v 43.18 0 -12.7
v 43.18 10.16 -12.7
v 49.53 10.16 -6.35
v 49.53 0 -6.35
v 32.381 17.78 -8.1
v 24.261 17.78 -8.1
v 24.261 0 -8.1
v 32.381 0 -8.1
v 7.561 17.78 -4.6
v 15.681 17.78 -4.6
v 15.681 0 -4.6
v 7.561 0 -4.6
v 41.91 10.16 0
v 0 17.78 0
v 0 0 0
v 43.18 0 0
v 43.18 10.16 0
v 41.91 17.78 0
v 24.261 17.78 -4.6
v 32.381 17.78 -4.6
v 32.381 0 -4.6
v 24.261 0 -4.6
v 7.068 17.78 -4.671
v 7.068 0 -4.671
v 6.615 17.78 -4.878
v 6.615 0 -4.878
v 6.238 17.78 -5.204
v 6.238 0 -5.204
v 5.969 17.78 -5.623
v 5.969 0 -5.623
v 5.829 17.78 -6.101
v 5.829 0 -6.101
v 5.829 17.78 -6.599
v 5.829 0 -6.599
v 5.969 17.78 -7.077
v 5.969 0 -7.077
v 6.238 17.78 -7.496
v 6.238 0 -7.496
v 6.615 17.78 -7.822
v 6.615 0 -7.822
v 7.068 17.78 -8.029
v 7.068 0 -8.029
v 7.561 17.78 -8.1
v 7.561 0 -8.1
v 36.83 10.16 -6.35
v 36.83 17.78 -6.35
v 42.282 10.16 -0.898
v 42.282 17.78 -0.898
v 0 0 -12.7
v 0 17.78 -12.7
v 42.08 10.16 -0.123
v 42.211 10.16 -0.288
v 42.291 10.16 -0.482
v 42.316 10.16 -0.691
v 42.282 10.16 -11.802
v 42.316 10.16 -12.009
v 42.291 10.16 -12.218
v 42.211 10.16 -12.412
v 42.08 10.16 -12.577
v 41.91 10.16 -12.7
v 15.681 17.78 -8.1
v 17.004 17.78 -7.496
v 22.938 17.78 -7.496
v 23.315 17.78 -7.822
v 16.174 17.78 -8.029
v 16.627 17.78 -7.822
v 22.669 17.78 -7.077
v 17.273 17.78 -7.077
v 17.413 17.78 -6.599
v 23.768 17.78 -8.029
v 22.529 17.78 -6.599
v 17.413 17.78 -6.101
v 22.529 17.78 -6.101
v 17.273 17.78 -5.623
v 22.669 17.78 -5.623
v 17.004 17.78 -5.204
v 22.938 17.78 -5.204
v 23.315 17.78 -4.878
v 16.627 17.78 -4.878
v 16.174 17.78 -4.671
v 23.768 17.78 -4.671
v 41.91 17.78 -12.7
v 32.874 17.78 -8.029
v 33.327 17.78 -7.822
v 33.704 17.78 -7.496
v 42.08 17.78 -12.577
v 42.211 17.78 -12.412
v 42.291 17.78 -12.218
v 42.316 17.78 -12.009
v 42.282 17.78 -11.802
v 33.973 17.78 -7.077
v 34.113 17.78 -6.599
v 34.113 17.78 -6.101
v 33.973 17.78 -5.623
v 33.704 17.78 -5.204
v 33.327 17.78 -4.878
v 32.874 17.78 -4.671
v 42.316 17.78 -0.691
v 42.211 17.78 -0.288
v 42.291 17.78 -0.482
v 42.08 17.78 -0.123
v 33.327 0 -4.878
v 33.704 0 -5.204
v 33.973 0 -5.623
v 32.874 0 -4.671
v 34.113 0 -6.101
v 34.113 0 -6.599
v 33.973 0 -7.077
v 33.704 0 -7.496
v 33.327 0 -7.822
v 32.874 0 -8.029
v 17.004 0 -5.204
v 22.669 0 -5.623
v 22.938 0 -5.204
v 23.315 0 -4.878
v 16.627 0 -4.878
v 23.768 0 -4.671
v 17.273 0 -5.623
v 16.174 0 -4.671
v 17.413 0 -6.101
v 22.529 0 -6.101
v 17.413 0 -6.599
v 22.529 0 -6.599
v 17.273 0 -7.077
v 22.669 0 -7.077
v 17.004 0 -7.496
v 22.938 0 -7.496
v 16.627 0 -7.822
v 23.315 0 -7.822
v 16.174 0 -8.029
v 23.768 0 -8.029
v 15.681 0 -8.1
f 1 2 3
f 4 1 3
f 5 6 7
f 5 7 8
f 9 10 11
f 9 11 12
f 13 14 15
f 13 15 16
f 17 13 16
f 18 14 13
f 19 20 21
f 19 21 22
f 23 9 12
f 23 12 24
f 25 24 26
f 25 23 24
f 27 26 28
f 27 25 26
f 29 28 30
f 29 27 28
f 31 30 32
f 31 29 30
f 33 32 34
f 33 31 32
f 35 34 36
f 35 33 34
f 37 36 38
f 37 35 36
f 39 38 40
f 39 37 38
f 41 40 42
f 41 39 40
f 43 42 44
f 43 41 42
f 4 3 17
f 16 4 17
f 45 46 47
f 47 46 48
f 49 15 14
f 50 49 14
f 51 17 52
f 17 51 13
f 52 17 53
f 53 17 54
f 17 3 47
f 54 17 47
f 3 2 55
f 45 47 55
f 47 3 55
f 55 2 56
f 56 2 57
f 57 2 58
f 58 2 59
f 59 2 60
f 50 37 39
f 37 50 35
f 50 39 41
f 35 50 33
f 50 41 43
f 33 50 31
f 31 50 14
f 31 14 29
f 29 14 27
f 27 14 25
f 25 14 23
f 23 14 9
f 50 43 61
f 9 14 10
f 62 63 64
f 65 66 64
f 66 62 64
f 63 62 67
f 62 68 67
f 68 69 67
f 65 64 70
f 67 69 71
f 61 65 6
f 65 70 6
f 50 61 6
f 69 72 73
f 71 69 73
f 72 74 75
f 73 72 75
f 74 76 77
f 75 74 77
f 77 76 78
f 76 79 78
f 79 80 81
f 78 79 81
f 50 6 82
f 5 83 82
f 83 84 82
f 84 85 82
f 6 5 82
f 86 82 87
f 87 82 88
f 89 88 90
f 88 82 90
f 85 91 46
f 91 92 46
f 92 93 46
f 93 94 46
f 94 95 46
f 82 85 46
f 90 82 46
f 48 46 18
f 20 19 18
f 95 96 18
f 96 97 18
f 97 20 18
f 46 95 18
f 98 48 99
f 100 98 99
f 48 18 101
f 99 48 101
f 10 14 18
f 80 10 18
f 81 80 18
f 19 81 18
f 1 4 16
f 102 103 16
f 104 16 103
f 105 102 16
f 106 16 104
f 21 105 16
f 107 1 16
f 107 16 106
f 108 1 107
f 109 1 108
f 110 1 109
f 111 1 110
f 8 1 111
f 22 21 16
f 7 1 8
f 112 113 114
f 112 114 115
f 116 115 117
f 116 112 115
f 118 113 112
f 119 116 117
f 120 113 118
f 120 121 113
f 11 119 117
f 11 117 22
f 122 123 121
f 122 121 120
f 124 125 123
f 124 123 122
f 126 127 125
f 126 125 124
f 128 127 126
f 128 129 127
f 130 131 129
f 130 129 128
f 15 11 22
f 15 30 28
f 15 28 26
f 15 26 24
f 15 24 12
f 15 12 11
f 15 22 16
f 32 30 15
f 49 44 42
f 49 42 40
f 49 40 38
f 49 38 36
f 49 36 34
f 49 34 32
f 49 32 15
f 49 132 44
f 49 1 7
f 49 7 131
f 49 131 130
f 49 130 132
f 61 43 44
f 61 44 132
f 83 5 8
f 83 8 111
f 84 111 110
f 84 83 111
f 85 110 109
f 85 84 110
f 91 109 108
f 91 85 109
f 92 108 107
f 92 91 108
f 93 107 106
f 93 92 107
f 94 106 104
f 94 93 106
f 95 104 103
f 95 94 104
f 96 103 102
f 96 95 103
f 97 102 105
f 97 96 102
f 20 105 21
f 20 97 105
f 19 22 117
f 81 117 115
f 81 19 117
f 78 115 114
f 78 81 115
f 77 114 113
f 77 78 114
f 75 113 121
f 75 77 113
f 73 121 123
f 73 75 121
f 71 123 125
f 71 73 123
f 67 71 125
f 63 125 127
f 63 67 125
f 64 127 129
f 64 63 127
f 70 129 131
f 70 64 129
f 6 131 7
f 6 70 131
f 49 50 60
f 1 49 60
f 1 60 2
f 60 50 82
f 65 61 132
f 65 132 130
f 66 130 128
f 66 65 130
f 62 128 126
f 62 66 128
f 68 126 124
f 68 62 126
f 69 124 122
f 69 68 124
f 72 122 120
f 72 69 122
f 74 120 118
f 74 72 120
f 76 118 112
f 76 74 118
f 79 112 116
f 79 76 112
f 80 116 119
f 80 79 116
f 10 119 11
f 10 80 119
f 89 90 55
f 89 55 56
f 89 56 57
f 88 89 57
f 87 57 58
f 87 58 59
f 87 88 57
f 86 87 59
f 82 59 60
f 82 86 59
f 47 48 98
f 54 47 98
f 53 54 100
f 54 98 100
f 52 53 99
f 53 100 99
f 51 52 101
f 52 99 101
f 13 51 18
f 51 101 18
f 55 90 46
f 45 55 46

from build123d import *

# Parameters (mm, degrees)
SKETCH1_W           = 43.18
SKETCH1_H           = 17.78
BOSS_EXTRUDE1_DEPTH = 12.7
CUT_EXTRUDE1_DEPTH  = 7.62
CUT_EXTRUDE2_DEPTH  = 18.78
BOSS_EXTRUDE2_DEPTH = 10.16
CUT_EXTRUDE3_DEPTH  = 7.62


with BuildPart() as part:
    # Sketch1 → Boss-Extrude1 (new body)
    with BuildSketch(Plane.XY):
        with Locations((21.59, 8.89)):
            Rectangle(SKETCH1_W, SKETCH1_H)
    extrude(amount=-BOSS_EXTRUDE1_DEPTH)

    # Sketch3 → Cut-Extrude1 (cut)
    with BuildSketch(Plane(origin=(0, 17.78, 0), x_dir=(1, 0, 0), z_dir=(0, 1, 0))):
        Polygon((43.18, 12.7), (36.83, 6.35), (43.18, 0), align=None)
    extrude(amount=-CUT_EXTRUDE1_DEPTH, mode=Mode.SUBTRACT)

    # Sketch4 → Cut-Extrude2 (cut, through all)
    with BuildSketch(Plane(origin=(0, 17.78, 0), x_dir=(1, 0, 0), z_dir=(0, 1, 0))):
        with BuildLine():
            Line((32.381000008, 4.599999944), (24.260999992, 4.599999944))
            ThreePointArc((24.260999992, 4.599999944), (22.510999936, 6.35), (24.260999992, 8.100000056))
            Line((24.260999992, 8.100000056), (32.381000008, 8.100000056))
            ThreePointArc((32.381000008, 8.100000056), (34.131000064, 6.35), (32.381000008, 4.599999944))
        make_face()
        with BuildLine():
            Line((15.68099988, 4.599999944), (7.560999864, 4.599999944))
            ThreePointArc((7.560999864, 4.599999944), (5.810999808, 6.35), (7.560999864, 8.100000056))
            Line((7.560999864, 8.100000056), (15.68099988, 8.100000056))
            ThreePointArc((15.68099988, 8.100000056), (17.430999936, 6.35), (15.68099988, 4.599999944))
        make_face()
    extrude(amount=-CUT_EXTRUDE2_DEPTH, mode=Mode.SUBTRACT)

    # Sketch5 → Boss-Extrude2 (add)
    with BuildSketch(Plane(origin=(0, 10.16, 0), x_dir=(1, 0, 0), z_dir=(0, 1, 0))):
        Polygon((43.18, 12.7), (49.53, 6.35), (43.18, 0), align=None)
    extrude(amount=-BOSS_EXTRUDE2_DEPTH)

    # Sketch6 → Cut-Extrude3 (cut)
    with BuildSketch(Plane(origin=(0, 17.78, 0), x_dir=(1, 0, 0), z_dir=(0, 1, 0))):
        with BuildLine():
            Line((41.91, 12.7), (43.18, 12.7))
            Line((43.18, 12.7), (42.281974388, 11.801974388))
            ThreePointArc((42.281974388, 11.801974388), (42.257767431, 12.317998762), (41.91, 12.7))
        make_face()
        with BuildLine():
            Line((41.91, 0), (43.18, 0))
            Line((43.18, 0), (42.281974388, 0.898025612))
            ThreePointArc((42.281974388, 0.898025612), (42.257767431, 0.382001238), (41.91, 0))
        make_face()
    extrude(amount=-CUT_EXTRUDE3_DEPTH, mode=Mode.SUBTRACT)


solid = part.part
